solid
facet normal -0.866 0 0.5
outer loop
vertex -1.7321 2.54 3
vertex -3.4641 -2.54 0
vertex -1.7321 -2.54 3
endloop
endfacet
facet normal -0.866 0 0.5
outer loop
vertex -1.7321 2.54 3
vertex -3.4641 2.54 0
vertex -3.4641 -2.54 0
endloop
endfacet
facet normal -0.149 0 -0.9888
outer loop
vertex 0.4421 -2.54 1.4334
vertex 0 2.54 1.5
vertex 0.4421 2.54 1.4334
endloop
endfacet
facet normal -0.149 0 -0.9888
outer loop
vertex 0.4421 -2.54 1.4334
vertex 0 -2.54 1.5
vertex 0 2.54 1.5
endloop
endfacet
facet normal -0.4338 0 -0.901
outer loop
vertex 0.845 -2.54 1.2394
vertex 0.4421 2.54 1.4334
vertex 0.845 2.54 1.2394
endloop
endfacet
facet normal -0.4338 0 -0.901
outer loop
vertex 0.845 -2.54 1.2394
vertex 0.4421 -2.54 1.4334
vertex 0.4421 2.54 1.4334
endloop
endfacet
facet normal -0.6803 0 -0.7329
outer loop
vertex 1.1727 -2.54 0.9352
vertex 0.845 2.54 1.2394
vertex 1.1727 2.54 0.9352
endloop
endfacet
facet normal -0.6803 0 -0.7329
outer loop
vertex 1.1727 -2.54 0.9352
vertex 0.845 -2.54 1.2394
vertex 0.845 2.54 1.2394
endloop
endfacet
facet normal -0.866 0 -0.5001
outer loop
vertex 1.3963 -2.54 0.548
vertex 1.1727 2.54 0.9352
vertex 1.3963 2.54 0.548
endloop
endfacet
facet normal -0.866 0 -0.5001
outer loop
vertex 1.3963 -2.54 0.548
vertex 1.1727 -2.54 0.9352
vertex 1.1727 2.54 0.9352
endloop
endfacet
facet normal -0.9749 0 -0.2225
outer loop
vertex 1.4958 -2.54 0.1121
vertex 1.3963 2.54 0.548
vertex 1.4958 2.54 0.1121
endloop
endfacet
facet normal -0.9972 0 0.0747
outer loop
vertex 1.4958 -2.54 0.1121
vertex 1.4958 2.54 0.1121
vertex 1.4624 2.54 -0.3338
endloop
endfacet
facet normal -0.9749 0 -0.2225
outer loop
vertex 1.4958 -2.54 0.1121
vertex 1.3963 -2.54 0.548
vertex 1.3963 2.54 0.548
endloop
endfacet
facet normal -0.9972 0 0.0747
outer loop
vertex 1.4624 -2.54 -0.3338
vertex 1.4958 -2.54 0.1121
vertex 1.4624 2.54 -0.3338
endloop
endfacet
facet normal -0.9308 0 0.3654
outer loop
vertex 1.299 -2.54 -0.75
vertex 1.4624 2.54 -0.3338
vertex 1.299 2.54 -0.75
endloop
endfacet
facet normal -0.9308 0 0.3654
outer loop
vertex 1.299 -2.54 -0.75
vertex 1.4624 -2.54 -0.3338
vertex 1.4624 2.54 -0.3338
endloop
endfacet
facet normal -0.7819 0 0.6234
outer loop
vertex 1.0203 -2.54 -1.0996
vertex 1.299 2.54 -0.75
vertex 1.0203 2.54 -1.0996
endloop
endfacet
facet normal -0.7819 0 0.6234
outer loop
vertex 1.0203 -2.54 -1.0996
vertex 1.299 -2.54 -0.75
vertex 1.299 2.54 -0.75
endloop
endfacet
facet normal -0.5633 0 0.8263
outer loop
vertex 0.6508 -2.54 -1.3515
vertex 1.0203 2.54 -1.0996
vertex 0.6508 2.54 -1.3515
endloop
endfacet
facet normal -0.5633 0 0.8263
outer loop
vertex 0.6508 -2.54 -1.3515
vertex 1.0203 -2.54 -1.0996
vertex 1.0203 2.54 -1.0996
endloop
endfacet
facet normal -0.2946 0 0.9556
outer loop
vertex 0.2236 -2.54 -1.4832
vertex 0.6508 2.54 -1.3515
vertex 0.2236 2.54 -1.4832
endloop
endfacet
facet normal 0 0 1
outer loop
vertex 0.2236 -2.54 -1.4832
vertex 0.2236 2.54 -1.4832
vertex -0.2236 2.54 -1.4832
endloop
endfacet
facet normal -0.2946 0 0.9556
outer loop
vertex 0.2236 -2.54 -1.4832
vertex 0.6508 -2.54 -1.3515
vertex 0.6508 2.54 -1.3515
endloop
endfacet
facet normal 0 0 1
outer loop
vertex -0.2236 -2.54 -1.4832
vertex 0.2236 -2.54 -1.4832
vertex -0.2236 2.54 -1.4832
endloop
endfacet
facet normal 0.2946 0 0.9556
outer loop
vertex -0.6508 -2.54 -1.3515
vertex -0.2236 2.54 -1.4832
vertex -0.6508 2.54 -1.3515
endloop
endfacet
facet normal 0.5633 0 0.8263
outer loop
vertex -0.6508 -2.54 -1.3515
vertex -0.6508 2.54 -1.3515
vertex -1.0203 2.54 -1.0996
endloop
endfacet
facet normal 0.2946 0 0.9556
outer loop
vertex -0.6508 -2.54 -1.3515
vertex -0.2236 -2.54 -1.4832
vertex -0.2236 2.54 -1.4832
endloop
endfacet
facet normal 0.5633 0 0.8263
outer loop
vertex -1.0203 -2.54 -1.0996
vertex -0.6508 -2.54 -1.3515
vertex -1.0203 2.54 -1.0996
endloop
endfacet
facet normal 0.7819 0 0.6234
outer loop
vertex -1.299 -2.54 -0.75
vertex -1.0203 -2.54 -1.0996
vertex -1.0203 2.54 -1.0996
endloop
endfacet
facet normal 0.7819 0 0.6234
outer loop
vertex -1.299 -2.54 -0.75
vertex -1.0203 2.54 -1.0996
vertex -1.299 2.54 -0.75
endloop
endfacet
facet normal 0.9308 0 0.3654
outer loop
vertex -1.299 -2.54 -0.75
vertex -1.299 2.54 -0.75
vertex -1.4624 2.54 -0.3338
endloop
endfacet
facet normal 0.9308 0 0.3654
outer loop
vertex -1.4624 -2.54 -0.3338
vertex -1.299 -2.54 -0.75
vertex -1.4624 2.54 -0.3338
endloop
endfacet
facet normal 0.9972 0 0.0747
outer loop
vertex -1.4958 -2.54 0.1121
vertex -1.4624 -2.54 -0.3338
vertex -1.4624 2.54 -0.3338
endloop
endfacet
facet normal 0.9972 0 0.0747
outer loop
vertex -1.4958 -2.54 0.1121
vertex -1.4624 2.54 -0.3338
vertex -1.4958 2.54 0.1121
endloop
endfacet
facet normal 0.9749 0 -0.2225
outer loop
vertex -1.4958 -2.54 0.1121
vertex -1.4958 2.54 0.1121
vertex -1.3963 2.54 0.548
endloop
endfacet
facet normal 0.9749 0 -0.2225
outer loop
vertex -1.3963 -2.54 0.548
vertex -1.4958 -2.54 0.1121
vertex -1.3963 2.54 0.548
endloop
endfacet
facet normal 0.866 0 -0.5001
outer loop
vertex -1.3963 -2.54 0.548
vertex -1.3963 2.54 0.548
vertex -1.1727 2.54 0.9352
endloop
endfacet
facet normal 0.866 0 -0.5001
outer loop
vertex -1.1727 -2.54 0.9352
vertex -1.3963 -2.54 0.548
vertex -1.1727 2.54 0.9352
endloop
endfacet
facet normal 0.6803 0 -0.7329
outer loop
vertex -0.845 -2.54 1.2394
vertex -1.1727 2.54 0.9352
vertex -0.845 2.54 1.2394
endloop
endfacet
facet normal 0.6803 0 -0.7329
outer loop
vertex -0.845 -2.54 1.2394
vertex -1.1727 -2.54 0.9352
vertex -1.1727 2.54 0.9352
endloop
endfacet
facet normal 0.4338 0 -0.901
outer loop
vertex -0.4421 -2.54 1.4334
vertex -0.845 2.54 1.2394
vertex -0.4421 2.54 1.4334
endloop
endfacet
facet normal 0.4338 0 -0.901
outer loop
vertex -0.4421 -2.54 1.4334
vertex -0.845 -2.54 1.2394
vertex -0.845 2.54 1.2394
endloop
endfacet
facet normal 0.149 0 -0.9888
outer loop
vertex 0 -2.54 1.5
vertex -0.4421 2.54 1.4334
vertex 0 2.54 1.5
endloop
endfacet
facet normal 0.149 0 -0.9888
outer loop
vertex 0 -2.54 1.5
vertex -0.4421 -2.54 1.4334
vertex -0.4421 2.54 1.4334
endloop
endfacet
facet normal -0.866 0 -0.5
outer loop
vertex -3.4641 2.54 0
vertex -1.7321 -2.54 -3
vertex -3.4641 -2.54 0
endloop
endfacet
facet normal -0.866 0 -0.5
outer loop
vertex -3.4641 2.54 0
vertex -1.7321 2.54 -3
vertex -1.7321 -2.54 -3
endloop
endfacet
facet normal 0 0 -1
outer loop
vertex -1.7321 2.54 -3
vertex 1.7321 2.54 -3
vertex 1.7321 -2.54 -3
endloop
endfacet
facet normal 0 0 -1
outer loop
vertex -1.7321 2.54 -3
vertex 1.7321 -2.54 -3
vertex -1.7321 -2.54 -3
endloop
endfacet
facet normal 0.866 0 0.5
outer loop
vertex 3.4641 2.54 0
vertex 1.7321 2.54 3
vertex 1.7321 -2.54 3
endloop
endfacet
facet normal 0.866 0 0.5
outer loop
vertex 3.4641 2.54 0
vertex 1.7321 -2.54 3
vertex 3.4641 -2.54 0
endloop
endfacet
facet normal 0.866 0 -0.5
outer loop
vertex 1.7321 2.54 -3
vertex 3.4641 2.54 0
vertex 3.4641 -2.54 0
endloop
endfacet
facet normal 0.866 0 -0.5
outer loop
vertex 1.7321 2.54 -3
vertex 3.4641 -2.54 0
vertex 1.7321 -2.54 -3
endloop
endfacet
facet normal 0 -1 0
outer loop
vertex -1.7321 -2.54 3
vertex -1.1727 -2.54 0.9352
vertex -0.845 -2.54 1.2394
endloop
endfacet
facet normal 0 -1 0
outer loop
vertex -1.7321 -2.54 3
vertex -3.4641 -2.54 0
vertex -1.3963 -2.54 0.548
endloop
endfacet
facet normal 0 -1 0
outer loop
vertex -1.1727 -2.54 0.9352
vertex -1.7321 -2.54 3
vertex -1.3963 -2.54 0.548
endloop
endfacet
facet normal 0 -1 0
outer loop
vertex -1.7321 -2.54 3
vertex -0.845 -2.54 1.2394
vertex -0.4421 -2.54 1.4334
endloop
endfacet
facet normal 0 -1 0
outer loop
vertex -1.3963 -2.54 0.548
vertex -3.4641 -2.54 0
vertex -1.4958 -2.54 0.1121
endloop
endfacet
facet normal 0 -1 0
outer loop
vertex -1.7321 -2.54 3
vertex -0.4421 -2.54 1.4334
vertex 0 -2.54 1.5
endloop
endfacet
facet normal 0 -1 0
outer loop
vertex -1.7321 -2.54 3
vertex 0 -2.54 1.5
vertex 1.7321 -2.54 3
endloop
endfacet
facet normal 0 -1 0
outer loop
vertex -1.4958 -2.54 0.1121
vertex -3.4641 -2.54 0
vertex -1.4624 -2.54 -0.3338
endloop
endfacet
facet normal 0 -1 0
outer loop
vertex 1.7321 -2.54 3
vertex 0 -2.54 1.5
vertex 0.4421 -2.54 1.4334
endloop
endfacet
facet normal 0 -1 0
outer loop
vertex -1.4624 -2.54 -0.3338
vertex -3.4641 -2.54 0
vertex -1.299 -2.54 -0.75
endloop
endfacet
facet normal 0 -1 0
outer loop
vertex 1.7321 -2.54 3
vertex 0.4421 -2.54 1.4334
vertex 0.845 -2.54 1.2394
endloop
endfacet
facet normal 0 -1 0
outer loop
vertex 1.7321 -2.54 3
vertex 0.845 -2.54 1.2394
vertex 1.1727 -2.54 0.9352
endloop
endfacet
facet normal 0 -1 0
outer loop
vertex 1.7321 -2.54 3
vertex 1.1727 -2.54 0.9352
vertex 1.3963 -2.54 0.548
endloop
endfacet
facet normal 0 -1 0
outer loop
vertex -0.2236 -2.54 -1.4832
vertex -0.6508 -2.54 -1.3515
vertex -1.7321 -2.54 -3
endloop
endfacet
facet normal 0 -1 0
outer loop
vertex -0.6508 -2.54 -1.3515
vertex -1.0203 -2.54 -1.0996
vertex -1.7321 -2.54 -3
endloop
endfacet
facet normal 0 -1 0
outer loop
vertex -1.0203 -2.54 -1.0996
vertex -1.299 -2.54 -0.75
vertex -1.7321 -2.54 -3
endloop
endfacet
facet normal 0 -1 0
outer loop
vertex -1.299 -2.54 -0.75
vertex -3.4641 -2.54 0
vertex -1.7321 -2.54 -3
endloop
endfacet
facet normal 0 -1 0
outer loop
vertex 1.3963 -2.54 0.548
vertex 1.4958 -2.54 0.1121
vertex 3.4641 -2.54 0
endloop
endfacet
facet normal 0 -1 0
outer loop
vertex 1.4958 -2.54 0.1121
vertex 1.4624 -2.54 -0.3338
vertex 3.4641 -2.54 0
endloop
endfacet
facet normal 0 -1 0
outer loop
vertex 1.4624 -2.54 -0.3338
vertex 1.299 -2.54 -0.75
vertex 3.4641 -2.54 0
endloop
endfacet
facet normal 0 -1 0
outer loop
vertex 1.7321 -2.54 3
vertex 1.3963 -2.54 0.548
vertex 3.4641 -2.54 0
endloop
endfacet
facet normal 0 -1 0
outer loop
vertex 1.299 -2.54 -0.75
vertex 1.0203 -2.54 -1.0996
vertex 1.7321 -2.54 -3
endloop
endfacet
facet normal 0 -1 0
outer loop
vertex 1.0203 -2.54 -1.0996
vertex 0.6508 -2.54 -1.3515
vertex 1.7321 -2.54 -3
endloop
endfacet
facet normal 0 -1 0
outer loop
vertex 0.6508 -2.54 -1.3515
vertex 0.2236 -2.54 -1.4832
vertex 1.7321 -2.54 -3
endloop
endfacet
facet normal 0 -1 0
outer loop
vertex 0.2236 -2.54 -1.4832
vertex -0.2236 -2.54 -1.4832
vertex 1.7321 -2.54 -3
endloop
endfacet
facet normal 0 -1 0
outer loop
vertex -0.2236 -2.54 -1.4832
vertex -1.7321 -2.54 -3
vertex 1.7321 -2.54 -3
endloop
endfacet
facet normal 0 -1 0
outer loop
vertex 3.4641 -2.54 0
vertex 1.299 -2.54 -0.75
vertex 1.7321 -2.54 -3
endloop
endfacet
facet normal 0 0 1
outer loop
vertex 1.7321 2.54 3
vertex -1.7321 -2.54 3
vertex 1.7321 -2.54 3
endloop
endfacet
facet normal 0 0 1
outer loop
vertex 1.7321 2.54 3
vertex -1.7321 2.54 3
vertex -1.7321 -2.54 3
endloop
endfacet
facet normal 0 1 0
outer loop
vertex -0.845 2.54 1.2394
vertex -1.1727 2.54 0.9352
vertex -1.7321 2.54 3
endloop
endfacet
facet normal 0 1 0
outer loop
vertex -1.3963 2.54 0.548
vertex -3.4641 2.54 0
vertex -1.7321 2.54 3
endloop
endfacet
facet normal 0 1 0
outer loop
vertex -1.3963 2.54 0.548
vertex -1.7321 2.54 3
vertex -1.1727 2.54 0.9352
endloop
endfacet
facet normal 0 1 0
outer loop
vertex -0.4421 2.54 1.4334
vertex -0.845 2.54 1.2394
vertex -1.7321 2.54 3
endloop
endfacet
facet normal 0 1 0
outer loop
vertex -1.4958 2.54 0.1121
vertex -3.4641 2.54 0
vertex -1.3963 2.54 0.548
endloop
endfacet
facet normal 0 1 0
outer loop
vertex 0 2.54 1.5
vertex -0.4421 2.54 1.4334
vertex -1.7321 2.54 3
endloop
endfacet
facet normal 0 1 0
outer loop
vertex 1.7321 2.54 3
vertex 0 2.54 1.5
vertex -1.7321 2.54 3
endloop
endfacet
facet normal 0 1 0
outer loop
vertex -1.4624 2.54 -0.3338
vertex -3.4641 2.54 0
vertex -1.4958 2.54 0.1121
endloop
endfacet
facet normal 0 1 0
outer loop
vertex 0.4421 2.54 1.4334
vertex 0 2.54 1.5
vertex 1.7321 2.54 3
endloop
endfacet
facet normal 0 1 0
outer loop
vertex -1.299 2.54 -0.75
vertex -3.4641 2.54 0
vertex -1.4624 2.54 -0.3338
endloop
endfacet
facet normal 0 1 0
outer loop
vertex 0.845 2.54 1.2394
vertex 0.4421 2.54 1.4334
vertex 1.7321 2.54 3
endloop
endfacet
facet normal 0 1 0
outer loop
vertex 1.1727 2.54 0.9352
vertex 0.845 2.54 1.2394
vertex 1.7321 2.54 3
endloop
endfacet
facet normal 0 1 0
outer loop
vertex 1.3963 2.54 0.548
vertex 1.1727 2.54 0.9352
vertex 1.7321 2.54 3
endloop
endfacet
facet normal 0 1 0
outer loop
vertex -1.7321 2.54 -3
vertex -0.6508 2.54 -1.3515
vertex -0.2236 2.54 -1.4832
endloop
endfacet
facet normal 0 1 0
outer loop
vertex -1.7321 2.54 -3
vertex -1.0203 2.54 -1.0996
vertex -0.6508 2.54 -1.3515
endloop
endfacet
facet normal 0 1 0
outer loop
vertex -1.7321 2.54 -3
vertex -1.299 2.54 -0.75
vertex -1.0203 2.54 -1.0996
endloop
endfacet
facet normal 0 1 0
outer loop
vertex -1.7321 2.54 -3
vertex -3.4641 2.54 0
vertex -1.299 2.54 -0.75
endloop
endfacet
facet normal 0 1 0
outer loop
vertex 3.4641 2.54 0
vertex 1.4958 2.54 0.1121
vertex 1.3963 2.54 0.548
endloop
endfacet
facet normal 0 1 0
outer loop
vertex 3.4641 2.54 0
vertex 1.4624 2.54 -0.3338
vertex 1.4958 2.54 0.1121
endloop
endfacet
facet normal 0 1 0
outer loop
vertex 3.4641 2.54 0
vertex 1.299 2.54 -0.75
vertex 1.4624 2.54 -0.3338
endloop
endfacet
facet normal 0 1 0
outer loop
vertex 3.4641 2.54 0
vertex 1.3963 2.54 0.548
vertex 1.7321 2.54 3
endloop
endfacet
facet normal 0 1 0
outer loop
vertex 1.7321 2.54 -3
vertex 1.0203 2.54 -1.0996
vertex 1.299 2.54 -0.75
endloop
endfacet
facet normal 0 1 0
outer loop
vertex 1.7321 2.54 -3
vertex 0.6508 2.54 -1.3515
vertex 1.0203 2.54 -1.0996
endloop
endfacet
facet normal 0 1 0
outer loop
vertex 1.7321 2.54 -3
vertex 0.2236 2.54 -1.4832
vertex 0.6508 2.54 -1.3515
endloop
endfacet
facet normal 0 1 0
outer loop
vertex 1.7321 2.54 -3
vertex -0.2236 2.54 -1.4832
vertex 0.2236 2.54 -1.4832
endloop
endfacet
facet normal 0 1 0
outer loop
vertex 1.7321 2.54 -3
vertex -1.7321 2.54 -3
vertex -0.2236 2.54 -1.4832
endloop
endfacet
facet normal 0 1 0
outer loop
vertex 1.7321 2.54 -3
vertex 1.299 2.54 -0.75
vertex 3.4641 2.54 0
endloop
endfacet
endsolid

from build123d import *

# Parameters (mm, degrees)
SKETCH1_R           = 1.5
BOSS_EXTRUDE1_DEPTH = 2.54


with BuildPart() as part:
    # Sketch1 → Boss-Extrude1 (new, symmetric)
    with BuildSketch(Plane(origin=(0, 0, 0), x_dir=(1, 0, 0), z_dir=(0, 1, 0))):
        Polygon((-1.732050808, -3), (1.732050808, -3), (3.464101615, 0), (1.732050808, 3), (-1.732050808, 3), (-3.464101615, 0), align=None)
        with Locations(Location((0, 0, 0), (0, 0, 270))):
            Circle(SKETCH1_R, mode=Mode.SUBTRACT)
    extrude(amount=BOSS_EXTRUDE1_DEPTH, both=True)


solid = part.part
